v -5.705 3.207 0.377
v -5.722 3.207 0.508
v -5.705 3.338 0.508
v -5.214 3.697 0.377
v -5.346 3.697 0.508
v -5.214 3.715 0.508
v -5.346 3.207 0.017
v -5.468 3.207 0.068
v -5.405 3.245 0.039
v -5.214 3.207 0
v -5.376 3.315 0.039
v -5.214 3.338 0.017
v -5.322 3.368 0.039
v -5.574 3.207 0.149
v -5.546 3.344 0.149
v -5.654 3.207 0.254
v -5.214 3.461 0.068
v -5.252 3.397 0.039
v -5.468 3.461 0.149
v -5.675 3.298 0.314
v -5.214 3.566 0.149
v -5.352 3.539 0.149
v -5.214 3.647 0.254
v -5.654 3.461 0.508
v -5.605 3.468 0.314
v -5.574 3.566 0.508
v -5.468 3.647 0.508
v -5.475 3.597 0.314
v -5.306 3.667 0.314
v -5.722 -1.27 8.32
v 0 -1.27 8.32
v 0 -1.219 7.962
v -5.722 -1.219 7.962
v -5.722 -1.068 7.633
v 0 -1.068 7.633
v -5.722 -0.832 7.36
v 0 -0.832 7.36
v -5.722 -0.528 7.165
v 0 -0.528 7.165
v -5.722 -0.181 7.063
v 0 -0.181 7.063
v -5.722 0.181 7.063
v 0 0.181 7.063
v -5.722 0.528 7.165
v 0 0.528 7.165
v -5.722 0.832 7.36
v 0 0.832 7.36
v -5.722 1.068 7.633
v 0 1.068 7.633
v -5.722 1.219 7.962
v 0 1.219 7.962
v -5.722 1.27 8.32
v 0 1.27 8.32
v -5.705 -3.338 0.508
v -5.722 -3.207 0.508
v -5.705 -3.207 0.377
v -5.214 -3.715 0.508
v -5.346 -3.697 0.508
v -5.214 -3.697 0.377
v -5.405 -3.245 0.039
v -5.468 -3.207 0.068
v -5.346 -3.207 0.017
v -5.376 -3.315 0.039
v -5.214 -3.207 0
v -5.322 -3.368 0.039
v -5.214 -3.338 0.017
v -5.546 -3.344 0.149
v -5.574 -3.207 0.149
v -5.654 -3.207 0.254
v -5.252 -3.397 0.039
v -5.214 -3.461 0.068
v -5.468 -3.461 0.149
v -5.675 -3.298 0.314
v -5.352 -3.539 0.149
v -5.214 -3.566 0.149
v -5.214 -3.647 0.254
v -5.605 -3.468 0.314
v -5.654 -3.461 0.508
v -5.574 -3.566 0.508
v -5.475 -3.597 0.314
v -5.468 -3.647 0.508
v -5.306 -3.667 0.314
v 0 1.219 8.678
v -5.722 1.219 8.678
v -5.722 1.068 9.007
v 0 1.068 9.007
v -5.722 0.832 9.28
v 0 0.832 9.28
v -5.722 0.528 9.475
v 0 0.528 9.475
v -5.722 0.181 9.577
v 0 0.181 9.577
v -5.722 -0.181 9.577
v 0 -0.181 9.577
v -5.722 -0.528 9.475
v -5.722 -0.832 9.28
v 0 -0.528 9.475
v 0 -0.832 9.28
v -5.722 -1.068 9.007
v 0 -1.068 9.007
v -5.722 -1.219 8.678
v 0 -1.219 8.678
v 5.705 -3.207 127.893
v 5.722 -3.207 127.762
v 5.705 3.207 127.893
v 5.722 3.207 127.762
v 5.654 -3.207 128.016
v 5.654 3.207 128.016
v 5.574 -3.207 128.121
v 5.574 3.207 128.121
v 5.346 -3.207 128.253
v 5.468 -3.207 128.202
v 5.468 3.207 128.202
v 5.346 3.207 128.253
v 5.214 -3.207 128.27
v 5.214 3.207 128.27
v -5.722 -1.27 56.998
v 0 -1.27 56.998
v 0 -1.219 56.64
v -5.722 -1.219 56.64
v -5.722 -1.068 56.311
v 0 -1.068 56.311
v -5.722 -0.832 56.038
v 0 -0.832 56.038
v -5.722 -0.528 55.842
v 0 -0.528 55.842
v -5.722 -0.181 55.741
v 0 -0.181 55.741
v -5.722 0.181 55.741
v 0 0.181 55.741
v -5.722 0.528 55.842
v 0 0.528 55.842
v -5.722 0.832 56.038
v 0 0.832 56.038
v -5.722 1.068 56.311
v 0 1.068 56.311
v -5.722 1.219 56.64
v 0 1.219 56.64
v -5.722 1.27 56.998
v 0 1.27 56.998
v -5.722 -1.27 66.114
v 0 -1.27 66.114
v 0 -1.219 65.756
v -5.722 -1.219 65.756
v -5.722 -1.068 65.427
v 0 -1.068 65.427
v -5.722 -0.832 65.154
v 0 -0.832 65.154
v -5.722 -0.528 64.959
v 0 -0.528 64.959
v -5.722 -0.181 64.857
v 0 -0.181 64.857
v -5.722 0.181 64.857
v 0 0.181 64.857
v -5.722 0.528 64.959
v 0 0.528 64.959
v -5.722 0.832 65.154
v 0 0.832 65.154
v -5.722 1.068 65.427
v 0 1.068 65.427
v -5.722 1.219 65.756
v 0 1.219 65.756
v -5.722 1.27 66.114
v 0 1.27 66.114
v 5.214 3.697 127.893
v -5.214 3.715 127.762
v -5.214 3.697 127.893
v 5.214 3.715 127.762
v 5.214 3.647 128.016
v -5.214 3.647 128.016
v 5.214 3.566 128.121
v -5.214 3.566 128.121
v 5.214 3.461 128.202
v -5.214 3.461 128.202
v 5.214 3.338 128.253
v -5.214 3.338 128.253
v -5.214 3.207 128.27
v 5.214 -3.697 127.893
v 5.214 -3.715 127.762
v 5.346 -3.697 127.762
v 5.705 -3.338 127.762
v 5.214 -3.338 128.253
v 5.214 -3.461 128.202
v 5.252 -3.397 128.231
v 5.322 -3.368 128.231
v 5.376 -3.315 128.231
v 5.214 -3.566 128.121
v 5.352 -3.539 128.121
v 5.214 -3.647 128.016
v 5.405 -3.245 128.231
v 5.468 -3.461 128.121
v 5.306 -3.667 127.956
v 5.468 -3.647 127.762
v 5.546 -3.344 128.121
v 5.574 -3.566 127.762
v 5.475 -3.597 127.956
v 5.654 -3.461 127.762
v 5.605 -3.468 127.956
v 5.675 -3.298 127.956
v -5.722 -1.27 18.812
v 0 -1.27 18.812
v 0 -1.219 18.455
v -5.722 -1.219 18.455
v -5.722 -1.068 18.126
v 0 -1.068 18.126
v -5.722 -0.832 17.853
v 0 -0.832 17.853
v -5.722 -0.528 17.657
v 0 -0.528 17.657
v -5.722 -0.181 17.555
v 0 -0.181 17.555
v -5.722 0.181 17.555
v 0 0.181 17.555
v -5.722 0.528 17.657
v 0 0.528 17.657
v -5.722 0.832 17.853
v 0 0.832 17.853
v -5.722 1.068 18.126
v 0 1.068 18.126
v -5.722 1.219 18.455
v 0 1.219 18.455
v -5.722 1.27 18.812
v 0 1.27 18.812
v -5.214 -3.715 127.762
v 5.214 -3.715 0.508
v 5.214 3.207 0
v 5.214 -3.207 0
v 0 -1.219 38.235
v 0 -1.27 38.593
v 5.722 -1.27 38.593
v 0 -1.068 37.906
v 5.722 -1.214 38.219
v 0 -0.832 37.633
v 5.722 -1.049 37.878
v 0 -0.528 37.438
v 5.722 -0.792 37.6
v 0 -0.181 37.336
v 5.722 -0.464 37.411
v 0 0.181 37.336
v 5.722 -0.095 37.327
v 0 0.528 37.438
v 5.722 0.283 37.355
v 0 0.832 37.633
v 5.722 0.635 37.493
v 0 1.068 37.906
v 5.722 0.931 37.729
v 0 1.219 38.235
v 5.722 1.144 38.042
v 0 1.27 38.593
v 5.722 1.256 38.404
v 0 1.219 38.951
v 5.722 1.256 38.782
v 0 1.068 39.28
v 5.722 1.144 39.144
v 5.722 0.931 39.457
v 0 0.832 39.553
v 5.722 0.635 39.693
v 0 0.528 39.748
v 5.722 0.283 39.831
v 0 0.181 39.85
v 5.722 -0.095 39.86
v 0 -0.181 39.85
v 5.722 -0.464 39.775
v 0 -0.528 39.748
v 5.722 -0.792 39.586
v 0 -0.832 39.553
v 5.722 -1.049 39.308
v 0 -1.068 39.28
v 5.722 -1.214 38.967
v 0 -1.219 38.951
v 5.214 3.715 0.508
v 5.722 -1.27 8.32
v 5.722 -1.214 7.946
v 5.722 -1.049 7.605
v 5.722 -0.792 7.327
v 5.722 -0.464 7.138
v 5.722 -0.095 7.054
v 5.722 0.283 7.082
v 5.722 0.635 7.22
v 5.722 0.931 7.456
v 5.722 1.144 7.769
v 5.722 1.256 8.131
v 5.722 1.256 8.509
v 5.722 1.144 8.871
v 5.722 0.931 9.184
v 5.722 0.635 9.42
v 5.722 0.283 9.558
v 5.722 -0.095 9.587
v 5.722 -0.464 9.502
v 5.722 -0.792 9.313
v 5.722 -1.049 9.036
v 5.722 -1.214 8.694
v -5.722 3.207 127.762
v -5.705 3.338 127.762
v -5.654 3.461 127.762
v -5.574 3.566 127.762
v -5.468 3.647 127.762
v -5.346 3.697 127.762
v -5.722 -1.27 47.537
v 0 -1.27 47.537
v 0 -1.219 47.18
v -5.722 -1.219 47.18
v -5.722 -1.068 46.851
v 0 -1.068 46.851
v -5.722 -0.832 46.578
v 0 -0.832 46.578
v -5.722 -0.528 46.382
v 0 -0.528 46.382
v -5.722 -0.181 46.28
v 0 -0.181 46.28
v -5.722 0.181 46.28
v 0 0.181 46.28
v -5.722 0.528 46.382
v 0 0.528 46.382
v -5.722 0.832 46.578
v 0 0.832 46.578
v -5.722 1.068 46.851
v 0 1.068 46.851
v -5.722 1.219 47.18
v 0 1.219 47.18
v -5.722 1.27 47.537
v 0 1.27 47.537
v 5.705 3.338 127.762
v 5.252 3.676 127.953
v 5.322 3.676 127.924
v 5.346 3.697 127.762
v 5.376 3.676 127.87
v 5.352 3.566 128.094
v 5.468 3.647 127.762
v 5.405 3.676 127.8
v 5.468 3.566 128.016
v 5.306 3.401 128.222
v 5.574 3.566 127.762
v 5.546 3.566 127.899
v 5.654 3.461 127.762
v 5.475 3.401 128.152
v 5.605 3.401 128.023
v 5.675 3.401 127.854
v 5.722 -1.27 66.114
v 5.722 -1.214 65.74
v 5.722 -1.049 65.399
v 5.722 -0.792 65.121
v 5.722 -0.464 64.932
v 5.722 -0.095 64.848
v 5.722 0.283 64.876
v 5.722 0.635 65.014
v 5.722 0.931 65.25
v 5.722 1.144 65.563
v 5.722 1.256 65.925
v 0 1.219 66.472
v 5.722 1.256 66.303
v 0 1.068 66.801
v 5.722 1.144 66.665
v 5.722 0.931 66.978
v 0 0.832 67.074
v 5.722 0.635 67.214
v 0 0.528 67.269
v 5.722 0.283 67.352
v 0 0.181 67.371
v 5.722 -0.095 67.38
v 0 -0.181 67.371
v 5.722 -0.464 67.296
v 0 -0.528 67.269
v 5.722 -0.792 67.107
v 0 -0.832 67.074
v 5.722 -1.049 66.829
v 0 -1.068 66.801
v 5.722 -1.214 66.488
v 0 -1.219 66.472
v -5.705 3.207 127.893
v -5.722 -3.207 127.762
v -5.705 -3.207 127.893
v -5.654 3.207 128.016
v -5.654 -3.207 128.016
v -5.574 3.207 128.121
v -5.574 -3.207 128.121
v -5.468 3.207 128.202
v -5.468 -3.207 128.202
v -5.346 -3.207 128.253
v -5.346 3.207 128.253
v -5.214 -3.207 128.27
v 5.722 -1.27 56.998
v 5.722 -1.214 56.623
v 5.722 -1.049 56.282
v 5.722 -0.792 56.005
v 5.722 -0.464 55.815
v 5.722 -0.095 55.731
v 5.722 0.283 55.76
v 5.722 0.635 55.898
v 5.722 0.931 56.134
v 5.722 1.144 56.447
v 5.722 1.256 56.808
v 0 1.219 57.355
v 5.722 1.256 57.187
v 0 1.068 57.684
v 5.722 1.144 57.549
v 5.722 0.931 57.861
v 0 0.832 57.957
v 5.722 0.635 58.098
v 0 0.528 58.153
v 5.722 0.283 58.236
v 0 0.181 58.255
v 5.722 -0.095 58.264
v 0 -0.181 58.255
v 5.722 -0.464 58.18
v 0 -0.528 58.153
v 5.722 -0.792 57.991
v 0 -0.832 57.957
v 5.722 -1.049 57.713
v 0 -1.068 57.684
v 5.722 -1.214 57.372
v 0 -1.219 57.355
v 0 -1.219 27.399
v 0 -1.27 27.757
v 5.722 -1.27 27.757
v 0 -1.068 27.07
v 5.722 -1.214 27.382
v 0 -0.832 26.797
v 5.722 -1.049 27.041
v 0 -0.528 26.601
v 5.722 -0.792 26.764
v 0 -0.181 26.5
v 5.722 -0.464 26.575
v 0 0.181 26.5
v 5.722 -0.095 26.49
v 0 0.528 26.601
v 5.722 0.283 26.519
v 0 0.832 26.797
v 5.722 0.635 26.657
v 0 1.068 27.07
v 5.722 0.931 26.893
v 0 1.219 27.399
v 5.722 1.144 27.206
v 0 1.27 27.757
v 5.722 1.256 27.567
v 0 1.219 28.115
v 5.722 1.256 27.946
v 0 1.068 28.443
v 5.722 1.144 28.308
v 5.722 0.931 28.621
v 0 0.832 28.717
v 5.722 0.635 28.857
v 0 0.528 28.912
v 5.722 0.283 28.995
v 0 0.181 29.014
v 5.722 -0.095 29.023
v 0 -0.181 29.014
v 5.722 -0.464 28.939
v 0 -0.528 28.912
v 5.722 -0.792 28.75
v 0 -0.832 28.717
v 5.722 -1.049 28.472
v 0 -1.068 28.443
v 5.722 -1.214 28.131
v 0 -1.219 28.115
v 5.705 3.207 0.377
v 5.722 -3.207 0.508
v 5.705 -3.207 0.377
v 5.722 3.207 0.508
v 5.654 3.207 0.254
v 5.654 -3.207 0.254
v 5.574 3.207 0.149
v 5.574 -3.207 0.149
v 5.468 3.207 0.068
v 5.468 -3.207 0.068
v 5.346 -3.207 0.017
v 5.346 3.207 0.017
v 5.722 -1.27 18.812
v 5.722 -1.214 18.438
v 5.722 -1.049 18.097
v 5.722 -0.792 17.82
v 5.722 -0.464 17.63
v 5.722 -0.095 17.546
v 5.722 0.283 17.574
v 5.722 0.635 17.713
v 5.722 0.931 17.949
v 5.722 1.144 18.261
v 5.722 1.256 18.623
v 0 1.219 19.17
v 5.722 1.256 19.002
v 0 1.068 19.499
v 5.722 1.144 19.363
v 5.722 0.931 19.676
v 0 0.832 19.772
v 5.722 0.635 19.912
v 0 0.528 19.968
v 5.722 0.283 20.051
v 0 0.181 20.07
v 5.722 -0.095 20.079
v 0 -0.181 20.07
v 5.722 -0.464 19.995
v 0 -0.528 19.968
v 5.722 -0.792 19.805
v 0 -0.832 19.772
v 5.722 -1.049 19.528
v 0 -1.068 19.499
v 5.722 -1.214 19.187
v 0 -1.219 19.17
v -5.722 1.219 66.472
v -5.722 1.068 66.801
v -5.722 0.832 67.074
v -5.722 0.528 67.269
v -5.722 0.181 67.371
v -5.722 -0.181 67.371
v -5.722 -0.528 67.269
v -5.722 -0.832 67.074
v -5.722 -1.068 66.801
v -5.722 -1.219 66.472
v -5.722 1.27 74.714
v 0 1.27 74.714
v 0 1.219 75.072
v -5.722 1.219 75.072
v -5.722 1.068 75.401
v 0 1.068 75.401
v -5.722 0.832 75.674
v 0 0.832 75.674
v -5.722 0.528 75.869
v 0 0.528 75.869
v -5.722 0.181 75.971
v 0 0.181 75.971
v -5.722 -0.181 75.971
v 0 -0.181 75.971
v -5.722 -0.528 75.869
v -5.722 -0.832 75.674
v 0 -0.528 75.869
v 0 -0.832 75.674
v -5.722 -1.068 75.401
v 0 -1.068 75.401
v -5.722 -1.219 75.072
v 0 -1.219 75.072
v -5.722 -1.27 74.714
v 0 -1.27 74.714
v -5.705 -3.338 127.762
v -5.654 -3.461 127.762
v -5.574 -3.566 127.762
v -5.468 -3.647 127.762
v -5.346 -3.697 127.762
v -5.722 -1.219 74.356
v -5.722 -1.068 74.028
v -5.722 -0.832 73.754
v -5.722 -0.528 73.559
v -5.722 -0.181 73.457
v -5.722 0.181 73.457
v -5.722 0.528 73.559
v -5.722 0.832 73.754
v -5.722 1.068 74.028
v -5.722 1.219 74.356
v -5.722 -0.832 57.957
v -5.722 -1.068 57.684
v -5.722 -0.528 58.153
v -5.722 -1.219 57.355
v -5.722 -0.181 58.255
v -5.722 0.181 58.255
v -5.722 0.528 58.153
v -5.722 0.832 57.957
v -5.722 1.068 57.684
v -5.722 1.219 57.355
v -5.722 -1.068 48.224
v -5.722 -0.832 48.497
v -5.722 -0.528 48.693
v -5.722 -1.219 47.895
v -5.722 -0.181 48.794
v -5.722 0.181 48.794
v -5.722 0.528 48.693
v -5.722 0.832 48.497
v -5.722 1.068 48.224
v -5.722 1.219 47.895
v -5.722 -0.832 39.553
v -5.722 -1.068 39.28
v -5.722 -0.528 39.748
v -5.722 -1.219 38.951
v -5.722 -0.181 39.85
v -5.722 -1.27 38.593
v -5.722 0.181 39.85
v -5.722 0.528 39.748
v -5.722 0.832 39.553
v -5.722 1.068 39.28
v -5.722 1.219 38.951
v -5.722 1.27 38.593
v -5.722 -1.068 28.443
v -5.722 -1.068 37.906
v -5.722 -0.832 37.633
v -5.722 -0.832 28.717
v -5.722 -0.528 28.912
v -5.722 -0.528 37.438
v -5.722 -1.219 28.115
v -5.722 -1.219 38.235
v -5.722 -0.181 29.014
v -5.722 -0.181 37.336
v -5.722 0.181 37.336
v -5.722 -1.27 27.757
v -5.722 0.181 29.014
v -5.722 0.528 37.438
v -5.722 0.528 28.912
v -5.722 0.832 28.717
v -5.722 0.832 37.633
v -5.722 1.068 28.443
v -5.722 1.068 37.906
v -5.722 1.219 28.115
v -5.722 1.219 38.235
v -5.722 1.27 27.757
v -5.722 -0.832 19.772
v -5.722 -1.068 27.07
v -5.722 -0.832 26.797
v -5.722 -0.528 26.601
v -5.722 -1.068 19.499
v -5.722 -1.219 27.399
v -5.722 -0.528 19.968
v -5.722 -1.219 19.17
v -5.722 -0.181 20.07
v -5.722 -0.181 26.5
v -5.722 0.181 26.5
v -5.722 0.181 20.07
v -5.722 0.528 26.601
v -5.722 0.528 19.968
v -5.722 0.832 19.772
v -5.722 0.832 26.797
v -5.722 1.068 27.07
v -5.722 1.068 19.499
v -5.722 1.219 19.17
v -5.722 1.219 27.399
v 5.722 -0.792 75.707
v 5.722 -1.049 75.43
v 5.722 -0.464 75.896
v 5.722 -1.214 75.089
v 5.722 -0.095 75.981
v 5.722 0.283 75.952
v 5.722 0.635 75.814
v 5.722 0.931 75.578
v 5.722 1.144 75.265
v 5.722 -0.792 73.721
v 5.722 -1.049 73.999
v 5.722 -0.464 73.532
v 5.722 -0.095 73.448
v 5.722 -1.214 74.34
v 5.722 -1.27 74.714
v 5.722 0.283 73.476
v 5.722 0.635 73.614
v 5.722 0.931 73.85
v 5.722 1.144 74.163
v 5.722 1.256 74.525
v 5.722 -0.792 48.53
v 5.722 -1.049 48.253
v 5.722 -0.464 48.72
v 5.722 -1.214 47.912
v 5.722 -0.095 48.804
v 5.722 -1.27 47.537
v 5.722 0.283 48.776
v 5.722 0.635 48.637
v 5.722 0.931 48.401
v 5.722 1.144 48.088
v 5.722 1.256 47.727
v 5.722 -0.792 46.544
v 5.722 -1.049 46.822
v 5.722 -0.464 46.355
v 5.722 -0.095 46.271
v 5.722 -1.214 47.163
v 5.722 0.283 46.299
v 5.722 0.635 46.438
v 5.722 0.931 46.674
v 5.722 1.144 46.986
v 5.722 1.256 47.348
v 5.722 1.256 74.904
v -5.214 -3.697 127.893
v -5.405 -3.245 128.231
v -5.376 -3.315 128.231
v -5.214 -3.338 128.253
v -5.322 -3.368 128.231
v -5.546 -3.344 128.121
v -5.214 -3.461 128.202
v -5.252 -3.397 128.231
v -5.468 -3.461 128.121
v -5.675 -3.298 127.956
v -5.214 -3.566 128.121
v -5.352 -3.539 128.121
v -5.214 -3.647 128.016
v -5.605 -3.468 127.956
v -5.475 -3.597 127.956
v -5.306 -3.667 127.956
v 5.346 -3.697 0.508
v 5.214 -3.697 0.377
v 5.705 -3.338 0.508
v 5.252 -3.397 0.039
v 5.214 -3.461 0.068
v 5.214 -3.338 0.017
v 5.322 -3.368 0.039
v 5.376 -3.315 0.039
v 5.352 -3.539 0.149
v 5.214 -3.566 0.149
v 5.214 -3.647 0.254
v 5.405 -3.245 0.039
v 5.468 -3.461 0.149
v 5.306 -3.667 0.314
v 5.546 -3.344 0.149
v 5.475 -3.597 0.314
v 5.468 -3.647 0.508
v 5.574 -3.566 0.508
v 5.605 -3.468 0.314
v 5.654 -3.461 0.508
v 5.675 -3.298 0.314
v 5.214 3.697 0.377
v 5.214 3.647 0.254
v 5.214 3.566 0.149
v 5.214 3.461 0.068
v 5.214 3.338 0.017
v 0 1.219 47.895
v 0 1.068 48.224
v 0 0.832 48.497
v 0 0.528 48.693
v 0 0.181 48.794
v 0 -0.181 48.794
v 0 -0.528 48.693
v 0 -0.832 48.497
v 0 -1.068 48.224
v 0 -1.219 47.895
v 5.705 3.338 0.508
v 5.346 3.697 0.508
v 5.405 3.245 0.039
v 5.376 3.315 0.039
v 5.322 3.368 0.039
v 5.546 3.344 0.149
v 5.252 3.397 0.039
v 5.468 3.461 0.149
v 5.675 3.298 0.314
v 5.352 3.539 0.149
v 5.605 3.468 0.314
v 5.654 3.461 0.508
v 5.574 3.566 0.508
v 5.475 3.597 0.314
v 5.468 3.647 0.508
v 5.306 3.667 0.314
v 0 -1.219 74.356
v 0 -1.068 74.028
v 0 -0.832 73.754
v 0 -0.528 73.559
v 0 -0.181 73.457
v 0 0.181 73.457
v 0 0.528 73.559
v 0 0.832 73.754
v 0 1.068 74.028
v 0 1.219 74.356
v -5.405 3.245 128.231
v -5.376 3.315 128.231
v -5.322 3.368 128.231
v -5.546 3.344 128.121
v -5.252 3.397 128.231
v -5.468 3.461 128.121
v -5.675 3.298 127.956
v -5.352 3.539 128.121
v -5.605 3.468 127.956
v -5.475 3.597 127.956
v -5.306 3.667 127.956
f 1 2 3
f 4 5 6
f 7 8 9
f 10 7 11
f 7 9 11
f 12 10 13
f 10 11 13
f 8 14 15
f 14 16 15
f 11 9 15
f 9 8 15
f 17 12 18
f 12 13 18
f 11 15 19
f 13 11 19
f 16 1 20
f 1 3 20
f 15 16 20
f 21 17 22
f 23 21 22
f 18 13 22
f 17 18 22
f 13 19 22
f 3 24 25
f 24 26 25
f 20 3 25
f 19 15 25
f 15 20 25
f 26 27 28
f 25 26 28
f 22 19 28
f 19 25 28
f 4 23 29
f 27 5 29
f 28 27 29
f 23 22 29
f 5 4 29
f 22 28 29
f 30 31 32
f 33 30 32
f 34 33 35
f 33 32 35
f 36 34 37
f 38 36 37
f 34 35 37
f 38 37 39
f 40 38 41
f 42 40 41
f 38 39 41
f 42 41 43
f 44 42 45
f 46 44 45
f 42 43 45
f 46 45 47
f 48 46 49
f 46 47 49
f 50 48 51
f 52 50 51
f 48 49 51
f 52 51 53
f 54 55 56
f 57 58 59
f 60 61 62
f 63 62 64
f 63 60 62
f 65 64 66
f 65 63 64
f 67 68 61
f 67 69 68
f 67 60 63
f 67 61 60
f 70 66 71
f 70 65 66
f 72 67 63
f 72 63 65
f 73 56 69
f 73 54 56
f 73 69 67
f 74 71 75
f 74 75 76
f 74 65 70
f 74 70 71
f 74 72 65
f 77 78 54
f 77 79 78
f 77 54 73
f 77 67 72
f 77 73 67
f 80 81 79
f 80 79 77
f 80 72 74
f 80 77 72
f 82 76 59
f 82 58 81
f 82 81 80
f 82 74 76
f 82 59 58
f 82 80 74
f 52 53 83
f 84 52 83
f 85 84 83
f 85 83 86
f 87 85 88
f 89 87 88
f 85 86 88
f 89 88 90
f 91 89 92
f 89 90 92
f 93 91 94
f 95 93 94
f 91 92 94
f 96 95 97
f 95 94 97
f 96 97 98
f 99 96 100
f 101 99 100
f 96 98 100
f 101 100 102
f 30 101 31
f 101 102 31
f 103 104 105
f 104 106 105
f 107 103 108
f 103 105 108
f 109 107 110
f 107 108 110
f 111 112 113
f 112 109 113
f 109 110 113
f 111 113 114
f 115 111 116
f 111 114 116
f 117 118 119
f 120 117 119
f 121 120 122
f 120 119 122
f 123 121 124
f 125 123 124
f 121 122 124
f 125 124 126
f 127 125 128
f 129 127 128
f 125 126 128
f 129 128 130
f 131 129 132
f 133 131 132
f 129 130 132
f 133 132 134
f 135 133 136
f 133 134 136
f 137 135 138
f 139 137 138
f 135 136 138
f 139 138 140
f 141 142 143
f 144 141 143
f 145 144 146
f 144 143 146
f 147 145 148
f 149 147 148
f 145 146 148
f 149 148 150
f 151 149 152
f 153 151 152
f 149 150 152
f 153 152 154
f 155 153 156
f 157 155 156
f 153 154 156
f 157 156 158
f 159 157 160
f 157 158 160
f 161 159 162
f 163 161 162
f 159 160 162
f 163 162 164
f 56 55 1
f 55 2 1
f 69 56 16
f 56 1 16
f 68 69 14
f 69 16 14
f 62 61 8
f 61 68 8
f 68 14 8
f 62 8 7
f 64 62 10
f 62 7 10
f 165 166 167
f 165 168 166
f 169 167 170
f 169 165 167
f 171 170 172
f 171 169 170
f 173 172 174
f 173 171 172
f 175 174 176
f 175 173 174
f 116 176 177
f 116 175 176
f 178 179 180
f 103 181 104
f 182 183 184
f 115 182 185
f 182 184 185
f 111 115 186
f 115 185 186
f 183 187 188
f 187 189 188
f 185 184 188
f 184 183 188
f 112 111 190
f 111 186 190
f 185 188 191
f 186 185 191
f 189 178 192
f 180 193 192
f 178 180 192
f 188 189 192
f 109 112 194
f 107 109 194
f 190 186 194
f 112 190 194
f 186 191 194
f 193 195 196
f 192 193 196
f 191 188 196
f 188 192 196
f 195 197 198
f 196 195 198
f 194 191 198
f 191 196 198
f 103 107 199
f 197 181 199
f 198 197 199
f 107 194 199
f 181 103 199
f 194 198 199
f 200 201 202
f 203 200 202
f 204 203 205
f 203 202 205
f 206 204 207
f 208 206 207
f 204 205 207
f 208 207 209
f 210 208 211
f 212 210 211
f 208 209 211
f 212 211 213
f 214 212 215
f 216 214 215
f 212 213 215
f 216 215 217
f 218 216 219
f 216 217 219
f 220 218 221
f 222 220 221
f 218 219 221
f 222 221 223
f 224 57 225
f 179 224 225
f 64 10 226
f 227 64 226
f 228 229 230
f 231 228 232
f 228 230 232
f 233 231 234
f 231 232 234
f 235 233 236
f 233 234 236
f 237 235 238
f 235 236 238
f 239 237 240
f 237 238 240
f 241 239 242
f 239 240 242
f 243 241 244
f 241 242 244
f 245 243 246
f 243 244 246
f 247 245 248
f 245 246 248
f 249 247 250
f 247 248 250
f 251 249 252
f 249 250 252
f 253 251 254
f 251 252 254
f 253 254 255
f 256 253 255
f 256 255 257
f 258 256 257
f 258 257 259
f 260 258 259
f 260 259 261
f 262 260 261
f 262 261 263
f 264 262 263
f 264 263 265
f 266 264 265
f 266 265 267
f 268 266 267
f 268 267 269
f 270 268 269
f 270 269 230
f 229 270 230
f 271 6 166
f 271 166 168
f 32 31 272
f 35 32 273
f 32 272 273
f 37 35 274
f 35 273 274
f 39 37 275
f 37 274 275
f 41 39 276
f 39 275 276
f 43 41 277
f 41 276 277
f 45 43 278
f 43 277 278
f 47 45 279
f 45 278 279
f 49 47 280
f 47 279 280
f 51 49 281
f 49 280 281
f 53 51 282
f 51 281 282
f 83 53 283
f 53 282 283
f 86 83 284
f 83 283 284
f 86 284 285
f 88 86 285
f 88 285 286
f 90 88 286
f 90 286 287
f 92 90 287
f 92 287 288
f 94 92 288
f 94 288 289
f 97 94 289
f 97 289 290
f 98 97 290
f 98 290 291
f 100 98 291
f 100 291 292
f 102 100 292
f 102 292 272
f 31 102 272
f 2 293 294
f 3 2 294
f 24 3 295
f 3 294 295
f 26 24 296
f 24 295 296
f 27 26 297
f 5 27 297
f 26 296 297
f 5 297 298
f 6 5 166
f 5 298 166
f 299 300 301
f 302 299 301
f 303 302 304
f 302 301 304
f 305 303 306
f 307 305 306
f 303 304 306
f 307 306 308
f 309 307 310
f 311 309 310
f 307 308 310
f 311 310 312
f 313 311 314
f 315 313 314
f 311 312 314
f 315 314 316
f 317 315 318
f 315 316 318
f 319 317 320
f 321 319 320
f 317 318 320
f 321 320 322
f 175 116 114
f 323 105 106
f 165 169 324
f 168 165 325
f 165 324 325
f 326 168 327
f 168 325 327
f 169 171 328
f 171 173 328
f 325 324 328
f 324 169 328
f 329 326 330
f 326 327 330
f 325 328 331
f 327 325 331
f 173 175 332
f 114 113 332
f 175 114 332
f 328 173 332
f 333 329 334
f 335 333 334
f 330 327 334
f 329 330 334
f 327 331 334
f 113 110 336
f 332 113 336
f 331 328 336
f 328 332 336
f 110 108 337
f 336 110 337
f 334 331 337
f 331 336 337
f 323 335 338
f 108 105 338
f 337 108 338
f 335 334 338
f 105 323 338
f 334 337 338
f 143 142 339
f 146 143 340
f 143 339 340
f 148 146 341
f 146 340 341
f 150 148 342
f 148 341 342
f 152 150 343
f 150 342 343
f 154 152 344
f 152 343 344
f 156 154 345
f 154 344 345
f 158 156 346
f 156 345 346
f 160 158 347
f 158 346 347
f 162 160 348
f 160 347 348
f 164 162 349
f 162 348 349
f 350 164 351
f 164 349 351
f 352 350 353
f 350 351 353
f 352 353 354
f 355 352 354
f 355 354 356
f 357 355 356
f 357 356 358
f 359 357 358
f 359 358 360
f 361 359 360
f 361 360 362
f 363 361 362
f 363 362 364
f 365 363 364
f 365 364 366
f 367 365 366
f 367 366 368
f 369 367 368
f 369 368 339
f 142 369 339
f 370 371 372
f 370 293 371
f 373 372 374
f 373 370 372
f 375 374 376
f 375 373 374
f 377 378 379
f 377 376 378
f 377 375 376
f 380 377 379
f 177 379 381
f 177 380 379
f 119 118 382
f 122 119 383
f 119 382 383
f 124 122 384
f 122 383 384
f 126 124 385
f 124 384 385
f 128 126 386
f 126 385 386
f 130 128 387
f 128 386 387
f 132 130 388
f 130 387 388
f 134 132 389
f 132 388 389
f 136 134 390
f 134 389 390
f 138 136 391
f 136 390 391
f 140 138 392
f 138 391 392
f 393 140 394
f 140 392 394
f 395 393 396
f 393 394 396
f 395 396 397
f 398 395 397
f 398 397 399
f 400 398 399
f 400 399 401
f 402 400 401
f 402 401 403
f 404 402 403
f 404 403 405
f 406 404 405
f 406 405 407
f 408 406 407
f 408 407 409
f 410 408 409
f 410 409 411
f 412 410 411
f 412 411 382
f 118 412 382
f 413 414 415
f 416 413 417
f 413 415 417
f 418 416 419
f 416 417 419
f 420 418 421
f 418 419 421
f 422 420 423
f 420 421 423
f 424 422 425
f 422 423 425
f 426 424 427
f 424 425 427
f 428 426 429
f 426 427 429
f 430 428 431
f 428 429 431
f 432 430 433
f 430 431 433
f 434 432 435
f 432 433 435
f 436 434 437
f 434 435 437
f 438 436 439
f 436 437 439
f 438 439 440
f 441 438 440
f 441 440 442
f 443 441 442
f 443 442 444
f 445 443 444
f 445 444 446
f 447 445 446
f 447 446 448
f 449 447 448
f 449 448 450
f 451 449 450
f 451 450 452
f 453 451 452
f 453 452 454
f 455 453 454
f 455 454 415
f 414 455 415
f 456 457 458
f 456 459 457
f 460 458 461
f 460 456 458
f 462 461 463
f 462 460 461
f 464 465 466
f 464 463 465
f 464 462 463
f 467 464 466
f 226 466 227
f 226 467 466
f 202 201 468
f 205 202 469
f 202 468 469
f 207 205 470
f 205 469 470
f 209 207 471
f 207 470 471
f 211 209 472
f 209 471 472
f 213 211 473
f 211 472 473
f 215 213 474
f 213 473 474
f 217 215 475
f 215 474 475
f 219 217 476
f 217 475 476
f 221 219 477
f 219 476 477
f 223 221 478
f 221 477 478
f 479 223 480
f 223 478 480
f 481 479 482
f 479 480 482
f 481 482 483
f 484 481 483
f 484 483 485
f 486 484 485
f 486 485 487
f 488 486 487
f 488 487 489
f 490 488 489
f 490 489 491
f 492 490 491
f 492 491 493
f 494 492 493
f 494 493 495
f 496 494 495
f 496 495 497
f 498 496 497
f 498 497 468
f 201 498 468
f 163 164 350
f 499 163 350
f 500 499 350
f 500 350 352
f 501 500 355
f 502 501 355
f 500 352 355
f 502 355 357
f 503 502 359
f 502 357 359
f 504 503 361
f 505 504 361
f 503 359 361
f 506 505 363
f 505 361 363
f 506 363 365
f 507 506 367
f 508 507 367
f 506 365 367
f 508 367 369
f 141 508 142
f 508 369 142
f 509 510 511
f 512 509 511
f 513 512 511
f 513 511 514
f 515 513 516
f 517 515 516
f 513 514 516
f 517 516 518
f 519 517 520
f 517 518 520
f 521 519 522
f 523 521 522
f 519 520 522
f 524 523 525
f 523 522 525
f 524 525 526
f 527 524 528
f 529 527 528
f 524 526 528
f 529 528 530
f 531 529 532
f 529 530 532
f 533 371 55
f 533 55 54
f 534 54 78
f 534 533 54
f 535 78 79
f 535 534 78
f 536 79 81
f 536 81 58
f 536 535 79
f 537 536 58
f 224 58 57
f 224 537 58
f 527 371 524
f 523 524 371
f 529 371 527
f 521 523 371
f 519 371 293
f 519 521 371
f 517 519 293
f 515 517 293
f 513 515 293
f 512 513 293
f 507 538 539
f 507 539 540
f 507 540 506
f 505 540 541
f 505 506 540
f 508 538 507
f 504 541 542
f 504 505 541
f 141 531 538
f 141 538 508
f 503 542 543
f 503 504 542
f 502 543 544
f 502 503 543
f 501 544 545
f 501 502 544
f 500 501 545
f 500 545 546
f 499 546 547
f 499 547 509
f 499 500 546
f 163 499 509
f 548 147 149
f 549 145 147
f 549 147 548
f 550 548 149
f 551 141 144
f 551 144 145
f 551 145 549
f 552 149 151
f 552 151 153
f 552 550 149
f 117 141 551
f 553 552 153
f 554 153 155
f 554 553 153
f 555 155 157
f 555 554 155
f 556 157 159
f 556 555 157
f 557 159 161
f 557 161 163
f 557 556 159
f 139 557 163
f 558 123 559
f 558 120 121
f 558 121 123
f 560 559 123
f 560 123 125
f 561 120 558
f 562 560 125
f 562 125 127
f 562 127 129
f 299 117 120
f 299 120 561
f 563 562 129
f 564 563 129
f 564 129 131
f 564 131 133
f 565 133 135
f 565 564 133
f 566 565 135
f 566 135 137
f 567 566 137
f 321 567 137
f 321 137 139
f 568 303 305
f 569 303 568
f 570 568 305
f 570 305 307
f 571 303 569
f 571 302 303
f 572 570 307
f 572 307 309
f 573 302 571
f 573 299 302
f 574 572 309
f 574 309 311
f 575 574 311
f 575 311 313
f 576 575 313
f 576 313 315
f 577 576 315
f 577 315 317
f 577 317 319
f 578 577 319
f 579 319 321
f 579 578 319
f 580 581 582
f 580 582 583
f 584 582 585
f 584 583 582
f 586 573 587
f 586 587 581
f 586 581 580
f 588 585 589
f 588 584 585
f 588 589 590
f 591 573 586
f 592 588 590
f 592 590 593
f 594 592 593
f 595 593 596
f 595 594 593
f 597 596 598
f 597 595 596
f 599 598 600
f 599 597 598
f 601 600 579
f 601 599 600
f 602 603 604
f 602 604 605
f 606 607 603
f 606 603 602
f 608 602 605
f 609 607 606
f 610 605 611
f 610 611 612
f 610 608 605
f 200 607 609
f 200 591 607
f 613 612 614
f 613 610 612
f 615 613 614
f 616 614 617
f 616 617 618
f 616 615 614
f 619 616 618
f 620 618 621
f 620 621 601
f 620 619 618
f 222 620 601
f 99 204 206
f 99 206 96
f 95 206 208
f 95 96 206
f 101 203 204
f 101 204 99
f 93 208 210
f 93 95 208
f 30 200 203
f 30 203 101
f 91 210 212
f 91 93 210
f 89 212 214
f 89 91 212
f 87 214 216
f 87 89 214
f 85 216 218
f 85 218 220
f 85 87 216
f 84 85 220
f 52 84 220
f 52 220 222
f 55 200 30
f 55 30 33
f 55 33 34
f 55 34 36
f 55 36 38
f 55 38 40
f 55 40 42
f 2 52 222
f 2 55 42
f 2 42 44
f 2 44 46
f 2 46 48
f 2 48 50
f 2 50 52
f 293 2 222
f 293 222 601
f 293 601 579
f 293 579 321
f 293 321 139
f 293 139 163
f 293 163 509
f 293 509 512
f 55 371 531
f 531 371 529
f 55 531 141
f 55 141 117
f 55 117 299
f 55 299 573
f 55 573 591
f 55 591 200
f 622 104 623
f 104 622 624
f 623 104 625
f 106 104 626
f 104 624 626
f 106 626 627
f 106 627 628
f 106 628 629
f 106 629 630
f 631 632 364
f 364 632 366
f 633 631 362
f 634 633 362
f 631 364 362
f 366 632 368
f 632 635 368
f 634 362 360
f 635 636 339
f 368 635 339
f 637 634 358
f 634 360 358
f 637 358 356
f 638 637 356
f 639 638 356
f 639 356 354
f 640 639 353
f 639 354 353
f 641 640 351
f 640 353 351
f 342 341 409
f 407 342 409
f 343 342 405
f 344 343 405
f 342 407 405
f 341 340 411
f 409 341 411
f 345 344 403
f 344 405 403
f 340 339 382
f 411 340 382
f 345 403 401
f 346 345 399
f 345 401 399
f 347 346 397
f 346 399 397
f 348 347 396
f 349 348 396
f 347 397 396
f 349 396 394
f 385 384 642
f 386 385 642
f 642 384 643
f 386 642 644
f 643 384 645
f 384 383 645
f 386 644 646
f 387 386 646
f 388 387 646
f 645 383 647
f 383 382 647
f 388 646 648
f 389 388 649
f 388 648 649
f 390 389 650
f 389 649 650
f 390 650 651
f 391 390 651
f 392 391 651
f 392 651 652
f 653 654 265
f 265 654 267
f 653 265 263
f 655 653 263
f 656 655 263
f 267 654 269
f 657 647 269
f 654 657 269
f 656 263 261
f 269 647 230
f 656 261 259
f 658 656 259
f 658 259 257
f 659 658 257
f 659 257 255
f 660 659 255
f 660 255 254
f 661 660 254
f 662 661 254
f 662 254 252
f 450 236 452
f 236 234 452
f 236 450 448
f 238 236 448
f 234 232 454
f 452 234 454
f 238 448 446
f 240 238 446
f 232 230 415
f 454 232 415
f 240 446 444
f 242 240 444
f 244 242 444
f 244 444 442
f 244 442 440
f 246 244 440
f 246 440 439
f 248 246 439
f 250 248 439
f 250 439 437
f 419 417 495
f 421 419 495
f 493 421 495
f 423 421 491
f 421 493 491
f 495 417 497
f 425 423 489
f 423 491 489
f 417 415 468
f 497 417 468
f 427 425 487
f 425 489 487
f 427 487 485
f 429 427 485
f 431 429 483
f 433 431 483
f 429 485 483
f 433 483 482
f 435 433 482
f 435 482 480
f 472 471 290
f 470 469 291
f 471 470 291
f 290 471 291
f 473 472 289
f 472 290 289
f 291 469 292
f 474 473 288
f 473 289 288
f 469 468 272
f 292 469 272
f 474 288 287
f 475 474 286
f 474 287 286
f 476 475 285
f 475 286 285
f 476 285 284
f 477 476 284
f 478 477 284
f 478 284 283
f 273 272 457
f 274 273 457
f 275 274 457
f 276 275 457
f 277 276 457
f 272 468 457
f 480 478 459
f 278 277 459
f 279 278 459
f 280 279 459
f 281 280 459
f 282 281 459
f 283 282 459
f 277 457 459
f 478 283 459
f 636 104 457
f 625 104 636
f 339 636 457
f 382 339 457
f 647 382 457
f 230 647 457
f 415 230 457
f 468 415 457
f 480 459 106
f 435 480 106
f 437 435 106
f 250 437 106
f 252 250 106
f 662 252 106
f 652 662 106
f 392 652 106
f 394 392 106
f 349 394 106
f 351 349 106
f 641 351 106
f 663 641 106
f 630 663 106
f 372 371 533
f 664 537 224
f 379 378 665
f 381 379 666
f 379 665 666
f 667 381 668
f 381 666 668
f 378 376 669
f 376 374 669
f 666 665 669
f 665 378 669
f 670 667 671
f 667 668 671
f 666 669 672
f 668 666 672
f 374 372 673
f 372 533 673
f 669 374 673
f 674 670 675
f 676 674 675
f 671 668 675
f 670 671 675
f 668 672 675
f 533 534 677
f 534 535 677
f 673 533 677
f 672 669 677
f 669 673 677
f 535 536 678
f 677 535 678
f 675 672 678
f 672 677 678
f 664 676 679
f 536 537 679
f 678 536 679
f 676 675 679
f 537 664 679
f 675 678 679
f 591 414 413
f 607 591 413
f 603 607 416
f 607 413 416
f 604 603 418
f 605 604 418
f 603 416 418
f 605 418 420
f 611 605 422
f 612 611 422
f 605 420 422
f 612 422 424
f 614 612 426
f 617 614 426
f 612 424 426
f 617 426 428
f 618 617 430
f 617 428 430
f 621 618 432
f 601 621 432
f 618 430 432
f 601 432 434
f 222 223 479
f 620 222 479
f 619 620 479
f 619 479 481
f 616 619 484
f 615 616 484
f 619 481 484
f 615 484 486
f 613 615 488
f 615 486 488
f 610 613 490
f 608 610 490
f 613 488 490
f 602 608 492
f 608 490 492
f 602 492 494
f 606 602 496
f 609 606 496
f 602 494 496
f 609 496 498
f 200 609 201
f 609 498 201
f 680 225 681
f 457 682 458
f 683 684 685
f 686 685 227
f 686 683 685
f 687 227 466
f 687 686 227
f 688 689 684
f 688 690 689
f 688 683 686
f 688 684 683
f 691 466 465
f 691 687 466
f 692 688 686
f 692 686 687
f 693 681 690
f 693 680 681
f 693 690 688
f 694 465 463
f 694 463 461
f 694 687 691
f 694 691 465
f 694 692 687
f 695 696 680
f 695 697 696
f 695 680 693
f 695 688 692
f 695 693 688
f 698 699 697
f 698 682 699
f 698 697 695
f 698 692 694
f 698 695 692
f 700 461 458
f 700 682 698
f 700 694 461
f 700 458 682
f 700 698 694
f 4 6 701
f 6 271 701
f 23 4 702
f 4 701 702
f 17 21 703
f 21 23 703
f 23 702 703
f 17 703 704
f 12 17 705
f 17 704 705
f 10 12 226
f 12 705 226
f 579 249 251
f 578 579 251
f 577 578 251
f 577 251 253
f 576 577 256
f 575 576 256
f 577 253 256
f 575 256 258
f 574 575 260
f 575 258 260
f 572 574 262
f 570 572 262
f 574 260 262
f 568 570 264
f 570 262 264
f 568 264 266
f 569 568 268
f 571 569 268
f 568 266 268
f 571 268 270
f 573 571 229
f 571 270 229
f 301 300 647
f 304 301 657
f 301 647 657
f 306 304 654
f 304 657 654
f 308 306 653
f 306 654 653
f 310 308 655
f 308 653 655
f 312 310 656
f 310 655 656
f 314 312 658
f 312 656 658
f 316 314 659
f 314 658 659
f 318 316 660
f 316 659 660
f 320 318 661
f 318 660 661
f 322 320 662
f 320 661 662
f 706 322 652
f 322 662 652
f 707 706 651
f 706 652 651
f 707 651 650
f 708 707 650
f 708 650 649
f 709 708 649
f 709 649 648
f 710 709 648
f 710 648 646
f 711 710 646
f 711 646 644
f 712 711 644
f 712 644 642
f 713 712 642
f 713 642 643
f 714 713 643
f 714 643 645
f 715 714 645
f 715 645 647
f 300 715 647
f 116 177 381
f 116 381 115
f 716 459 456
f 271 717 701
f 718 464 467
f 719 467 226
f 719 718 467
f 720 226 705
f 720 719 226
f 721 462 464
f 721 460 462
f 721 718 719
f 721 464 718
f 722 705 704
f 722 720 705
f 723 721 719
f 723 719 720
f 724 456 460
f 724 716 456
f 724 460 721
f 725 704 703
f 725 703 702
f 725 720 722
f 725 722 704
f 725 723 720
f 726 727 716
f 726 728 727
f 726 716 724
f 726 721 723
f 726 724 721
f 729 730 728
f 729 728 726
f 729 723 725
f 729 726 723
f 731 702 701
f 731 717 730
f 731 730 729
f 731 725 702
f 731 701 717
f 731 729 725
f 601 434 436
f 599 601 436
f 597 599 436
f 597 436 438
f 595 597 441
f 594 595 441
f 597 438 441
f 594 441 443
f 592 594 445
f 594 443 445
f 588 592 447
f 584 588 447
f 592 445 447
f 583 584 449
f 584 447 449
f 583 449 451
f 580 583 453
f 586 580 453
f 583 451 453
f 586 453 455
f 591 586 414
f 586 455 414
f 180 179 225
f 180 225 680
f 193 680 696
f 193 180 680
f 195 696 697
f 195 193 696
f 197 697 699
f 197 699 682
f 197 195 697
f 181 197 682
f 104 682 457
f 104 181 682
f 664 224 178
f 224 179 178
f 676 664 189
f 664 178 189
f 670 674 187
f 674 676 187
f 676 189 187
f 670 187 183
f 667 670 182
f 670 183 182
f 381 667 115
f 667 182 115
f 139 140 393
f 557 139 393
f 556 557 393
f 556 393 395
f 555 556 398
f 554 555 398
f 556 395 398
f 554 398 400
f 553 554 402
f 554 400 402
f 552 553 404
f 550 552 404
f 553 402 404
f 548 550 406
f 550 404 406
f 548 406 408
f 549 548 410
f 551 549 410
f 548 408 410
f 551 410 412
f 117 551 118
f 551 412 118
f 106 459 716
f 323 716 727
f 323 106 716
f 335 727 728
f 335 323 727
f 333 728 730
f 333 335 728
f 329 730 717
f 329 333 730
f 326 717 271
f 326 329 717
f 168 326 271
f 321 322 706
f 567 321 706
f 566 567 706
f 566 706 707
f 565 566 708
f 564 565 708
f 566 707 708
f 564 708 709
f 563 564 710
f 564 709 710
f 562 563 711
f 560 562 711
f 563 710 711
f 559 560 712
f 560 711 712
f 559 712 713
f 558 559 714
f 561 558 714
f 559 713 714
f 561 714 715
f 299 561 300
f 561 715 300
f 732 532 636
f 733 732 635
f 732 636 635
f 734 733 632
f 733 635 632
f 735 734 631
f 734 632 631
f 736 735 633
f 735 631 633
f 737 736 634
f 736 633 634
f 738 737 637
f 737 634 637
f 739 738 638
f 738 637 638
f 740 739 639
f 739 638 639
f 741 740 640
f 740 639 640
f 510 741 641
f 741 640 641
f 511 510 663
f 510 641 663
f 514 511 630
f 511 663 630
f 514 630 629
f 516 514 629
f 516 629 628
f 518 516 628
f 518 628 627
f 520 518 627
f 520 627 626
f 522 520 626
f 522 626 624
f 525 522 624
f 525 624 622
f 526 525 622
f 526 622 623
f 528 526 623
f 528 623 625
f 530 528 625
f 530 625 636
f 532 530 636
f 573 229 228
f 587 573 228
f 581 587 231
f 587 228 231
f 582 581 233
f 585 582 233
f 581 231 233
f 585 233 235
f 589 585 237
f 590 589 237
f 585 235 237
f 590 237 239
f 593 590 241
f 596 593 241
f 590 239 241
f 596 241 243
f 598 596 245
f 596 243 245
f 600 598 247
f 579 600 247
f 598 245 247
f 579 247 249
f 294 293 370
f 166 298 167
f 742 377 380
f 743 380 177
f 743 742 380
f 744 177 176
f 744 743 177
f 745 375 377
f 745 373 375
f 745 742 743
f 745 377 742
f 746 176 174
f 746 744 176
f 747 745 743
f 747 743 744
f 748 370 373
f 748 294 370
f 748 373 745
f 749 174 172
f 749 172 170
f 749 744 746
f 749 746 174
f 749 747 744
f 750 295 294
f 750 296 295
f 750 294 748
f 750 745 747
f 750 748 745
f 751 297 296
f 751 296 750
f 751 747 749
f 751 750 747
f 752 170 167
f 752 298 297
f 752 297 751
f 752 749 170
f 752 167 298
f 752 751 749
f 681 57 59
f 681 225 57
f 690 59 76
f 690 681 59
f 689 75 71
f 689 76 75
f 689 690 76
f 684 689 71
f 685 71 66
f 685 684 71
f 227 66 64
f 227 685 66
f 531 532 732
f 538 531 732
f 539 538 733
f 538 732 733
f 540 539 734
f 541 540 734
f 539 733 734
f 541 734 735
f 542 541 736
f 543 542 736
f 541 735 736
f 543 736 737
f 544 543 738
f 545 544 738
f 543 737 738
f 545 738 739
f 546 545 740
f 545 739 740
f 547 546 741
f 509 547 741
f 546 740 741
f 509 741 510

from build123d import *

# Parameters (mm, degrees)
F0_W     = 11.4448349923
F0_H     = 7.429568097
F1_DEPTH = 128.27
F2_R     = 0.508
F4_D     = 2.54
F4_DEPTH = 12.7
F4_TIP   = 0.7630929862
F5_D     = 2.54
F5_DEPTH = 12.7
F5_TIP   = 0.7630929862


with BuildPart() as f1:
    # F0 (on Top) → F1 (new body)
    with BuildSketch(Plane.XY):
        Rectangle(F0_W, F0_H)
    extrude(amount=F1_DEPTH)

    # F2
    f2_edges = [f1.edges().sort_by_distance(p)[0] for p in [
        (-5.722417, 3.714784, 64.135),
        (-5.722417, -3.714784, 64.135),
        (-5.722417, 0, 0),
        (-5.722417, 0, 128.27),
        (5.722417, -3.714784, 64.135),
        (0, -3.714784, 0),
        (0, -3.714784, 128.27),
        (5.722417, 0, 128.27),
        (0, 3.714784, 128.27),
        (5.722417, 3.714784, 64.135),
        (5.722417, 0, 0),
        (0, 3.714784, 0),
    ]]
    fillet(f2_edges, radius=F2_R)

    # F4 (one way)
    with BuildSketch(Plane.YZ):
        with Locations((0, 74.714243412), (0, 66.1139637232), (0, 56.9976679981), (0, 47.5373640656), (0, 38.5930761695), (0, 27.7567245066), (0, 18.8124384731), (0, 8.3200978115)):
            Circle(F4_D / 2)
    extrude(amount=-F4_DEPTH, mode=Mode.SUBTRACT)
    with Locations(Plane.YZ):
        with Locations((0, 74.714243412), (0, 66.1139637232), (0, 56.9976679981), (0, 47.5373640656), (0, 38.5930761695), (0, 27.7567245066), (0, 18.8124384731), (0, 8.3200978115)):
            with Locations((0, 0, -(F4_DEPTH + F4_TIP / 2))):  # 118° drill point
                Cone(0, F4_D / 2, F4_TIP, mode=Mode.SUBTRACT)

    # F5
    with Locations(Plane(origin=(0, 0, 0), x_dir=(0, 1, 0), z_dir=(-1, 0, 0))):
        with Locations((0, -74.714243412), (0, -66.1139637232), (0, -56.9976679981), (0, -47.5373640656), (0, -38.5930761695), (0, -27.7567245066), (0, -18.8124384731), (0, -8.3200978115)):
            Hole(F5_D / 2, depth=F5_DEPTH)
            with Locations((0, 0, -(F5_DEPTH + F5_TIP / 2))):  # 118° drill point
                Cone(0, F5_D / 2, F5_TIP, mode=Mode.SUBTRACT)


solid = f1.part
